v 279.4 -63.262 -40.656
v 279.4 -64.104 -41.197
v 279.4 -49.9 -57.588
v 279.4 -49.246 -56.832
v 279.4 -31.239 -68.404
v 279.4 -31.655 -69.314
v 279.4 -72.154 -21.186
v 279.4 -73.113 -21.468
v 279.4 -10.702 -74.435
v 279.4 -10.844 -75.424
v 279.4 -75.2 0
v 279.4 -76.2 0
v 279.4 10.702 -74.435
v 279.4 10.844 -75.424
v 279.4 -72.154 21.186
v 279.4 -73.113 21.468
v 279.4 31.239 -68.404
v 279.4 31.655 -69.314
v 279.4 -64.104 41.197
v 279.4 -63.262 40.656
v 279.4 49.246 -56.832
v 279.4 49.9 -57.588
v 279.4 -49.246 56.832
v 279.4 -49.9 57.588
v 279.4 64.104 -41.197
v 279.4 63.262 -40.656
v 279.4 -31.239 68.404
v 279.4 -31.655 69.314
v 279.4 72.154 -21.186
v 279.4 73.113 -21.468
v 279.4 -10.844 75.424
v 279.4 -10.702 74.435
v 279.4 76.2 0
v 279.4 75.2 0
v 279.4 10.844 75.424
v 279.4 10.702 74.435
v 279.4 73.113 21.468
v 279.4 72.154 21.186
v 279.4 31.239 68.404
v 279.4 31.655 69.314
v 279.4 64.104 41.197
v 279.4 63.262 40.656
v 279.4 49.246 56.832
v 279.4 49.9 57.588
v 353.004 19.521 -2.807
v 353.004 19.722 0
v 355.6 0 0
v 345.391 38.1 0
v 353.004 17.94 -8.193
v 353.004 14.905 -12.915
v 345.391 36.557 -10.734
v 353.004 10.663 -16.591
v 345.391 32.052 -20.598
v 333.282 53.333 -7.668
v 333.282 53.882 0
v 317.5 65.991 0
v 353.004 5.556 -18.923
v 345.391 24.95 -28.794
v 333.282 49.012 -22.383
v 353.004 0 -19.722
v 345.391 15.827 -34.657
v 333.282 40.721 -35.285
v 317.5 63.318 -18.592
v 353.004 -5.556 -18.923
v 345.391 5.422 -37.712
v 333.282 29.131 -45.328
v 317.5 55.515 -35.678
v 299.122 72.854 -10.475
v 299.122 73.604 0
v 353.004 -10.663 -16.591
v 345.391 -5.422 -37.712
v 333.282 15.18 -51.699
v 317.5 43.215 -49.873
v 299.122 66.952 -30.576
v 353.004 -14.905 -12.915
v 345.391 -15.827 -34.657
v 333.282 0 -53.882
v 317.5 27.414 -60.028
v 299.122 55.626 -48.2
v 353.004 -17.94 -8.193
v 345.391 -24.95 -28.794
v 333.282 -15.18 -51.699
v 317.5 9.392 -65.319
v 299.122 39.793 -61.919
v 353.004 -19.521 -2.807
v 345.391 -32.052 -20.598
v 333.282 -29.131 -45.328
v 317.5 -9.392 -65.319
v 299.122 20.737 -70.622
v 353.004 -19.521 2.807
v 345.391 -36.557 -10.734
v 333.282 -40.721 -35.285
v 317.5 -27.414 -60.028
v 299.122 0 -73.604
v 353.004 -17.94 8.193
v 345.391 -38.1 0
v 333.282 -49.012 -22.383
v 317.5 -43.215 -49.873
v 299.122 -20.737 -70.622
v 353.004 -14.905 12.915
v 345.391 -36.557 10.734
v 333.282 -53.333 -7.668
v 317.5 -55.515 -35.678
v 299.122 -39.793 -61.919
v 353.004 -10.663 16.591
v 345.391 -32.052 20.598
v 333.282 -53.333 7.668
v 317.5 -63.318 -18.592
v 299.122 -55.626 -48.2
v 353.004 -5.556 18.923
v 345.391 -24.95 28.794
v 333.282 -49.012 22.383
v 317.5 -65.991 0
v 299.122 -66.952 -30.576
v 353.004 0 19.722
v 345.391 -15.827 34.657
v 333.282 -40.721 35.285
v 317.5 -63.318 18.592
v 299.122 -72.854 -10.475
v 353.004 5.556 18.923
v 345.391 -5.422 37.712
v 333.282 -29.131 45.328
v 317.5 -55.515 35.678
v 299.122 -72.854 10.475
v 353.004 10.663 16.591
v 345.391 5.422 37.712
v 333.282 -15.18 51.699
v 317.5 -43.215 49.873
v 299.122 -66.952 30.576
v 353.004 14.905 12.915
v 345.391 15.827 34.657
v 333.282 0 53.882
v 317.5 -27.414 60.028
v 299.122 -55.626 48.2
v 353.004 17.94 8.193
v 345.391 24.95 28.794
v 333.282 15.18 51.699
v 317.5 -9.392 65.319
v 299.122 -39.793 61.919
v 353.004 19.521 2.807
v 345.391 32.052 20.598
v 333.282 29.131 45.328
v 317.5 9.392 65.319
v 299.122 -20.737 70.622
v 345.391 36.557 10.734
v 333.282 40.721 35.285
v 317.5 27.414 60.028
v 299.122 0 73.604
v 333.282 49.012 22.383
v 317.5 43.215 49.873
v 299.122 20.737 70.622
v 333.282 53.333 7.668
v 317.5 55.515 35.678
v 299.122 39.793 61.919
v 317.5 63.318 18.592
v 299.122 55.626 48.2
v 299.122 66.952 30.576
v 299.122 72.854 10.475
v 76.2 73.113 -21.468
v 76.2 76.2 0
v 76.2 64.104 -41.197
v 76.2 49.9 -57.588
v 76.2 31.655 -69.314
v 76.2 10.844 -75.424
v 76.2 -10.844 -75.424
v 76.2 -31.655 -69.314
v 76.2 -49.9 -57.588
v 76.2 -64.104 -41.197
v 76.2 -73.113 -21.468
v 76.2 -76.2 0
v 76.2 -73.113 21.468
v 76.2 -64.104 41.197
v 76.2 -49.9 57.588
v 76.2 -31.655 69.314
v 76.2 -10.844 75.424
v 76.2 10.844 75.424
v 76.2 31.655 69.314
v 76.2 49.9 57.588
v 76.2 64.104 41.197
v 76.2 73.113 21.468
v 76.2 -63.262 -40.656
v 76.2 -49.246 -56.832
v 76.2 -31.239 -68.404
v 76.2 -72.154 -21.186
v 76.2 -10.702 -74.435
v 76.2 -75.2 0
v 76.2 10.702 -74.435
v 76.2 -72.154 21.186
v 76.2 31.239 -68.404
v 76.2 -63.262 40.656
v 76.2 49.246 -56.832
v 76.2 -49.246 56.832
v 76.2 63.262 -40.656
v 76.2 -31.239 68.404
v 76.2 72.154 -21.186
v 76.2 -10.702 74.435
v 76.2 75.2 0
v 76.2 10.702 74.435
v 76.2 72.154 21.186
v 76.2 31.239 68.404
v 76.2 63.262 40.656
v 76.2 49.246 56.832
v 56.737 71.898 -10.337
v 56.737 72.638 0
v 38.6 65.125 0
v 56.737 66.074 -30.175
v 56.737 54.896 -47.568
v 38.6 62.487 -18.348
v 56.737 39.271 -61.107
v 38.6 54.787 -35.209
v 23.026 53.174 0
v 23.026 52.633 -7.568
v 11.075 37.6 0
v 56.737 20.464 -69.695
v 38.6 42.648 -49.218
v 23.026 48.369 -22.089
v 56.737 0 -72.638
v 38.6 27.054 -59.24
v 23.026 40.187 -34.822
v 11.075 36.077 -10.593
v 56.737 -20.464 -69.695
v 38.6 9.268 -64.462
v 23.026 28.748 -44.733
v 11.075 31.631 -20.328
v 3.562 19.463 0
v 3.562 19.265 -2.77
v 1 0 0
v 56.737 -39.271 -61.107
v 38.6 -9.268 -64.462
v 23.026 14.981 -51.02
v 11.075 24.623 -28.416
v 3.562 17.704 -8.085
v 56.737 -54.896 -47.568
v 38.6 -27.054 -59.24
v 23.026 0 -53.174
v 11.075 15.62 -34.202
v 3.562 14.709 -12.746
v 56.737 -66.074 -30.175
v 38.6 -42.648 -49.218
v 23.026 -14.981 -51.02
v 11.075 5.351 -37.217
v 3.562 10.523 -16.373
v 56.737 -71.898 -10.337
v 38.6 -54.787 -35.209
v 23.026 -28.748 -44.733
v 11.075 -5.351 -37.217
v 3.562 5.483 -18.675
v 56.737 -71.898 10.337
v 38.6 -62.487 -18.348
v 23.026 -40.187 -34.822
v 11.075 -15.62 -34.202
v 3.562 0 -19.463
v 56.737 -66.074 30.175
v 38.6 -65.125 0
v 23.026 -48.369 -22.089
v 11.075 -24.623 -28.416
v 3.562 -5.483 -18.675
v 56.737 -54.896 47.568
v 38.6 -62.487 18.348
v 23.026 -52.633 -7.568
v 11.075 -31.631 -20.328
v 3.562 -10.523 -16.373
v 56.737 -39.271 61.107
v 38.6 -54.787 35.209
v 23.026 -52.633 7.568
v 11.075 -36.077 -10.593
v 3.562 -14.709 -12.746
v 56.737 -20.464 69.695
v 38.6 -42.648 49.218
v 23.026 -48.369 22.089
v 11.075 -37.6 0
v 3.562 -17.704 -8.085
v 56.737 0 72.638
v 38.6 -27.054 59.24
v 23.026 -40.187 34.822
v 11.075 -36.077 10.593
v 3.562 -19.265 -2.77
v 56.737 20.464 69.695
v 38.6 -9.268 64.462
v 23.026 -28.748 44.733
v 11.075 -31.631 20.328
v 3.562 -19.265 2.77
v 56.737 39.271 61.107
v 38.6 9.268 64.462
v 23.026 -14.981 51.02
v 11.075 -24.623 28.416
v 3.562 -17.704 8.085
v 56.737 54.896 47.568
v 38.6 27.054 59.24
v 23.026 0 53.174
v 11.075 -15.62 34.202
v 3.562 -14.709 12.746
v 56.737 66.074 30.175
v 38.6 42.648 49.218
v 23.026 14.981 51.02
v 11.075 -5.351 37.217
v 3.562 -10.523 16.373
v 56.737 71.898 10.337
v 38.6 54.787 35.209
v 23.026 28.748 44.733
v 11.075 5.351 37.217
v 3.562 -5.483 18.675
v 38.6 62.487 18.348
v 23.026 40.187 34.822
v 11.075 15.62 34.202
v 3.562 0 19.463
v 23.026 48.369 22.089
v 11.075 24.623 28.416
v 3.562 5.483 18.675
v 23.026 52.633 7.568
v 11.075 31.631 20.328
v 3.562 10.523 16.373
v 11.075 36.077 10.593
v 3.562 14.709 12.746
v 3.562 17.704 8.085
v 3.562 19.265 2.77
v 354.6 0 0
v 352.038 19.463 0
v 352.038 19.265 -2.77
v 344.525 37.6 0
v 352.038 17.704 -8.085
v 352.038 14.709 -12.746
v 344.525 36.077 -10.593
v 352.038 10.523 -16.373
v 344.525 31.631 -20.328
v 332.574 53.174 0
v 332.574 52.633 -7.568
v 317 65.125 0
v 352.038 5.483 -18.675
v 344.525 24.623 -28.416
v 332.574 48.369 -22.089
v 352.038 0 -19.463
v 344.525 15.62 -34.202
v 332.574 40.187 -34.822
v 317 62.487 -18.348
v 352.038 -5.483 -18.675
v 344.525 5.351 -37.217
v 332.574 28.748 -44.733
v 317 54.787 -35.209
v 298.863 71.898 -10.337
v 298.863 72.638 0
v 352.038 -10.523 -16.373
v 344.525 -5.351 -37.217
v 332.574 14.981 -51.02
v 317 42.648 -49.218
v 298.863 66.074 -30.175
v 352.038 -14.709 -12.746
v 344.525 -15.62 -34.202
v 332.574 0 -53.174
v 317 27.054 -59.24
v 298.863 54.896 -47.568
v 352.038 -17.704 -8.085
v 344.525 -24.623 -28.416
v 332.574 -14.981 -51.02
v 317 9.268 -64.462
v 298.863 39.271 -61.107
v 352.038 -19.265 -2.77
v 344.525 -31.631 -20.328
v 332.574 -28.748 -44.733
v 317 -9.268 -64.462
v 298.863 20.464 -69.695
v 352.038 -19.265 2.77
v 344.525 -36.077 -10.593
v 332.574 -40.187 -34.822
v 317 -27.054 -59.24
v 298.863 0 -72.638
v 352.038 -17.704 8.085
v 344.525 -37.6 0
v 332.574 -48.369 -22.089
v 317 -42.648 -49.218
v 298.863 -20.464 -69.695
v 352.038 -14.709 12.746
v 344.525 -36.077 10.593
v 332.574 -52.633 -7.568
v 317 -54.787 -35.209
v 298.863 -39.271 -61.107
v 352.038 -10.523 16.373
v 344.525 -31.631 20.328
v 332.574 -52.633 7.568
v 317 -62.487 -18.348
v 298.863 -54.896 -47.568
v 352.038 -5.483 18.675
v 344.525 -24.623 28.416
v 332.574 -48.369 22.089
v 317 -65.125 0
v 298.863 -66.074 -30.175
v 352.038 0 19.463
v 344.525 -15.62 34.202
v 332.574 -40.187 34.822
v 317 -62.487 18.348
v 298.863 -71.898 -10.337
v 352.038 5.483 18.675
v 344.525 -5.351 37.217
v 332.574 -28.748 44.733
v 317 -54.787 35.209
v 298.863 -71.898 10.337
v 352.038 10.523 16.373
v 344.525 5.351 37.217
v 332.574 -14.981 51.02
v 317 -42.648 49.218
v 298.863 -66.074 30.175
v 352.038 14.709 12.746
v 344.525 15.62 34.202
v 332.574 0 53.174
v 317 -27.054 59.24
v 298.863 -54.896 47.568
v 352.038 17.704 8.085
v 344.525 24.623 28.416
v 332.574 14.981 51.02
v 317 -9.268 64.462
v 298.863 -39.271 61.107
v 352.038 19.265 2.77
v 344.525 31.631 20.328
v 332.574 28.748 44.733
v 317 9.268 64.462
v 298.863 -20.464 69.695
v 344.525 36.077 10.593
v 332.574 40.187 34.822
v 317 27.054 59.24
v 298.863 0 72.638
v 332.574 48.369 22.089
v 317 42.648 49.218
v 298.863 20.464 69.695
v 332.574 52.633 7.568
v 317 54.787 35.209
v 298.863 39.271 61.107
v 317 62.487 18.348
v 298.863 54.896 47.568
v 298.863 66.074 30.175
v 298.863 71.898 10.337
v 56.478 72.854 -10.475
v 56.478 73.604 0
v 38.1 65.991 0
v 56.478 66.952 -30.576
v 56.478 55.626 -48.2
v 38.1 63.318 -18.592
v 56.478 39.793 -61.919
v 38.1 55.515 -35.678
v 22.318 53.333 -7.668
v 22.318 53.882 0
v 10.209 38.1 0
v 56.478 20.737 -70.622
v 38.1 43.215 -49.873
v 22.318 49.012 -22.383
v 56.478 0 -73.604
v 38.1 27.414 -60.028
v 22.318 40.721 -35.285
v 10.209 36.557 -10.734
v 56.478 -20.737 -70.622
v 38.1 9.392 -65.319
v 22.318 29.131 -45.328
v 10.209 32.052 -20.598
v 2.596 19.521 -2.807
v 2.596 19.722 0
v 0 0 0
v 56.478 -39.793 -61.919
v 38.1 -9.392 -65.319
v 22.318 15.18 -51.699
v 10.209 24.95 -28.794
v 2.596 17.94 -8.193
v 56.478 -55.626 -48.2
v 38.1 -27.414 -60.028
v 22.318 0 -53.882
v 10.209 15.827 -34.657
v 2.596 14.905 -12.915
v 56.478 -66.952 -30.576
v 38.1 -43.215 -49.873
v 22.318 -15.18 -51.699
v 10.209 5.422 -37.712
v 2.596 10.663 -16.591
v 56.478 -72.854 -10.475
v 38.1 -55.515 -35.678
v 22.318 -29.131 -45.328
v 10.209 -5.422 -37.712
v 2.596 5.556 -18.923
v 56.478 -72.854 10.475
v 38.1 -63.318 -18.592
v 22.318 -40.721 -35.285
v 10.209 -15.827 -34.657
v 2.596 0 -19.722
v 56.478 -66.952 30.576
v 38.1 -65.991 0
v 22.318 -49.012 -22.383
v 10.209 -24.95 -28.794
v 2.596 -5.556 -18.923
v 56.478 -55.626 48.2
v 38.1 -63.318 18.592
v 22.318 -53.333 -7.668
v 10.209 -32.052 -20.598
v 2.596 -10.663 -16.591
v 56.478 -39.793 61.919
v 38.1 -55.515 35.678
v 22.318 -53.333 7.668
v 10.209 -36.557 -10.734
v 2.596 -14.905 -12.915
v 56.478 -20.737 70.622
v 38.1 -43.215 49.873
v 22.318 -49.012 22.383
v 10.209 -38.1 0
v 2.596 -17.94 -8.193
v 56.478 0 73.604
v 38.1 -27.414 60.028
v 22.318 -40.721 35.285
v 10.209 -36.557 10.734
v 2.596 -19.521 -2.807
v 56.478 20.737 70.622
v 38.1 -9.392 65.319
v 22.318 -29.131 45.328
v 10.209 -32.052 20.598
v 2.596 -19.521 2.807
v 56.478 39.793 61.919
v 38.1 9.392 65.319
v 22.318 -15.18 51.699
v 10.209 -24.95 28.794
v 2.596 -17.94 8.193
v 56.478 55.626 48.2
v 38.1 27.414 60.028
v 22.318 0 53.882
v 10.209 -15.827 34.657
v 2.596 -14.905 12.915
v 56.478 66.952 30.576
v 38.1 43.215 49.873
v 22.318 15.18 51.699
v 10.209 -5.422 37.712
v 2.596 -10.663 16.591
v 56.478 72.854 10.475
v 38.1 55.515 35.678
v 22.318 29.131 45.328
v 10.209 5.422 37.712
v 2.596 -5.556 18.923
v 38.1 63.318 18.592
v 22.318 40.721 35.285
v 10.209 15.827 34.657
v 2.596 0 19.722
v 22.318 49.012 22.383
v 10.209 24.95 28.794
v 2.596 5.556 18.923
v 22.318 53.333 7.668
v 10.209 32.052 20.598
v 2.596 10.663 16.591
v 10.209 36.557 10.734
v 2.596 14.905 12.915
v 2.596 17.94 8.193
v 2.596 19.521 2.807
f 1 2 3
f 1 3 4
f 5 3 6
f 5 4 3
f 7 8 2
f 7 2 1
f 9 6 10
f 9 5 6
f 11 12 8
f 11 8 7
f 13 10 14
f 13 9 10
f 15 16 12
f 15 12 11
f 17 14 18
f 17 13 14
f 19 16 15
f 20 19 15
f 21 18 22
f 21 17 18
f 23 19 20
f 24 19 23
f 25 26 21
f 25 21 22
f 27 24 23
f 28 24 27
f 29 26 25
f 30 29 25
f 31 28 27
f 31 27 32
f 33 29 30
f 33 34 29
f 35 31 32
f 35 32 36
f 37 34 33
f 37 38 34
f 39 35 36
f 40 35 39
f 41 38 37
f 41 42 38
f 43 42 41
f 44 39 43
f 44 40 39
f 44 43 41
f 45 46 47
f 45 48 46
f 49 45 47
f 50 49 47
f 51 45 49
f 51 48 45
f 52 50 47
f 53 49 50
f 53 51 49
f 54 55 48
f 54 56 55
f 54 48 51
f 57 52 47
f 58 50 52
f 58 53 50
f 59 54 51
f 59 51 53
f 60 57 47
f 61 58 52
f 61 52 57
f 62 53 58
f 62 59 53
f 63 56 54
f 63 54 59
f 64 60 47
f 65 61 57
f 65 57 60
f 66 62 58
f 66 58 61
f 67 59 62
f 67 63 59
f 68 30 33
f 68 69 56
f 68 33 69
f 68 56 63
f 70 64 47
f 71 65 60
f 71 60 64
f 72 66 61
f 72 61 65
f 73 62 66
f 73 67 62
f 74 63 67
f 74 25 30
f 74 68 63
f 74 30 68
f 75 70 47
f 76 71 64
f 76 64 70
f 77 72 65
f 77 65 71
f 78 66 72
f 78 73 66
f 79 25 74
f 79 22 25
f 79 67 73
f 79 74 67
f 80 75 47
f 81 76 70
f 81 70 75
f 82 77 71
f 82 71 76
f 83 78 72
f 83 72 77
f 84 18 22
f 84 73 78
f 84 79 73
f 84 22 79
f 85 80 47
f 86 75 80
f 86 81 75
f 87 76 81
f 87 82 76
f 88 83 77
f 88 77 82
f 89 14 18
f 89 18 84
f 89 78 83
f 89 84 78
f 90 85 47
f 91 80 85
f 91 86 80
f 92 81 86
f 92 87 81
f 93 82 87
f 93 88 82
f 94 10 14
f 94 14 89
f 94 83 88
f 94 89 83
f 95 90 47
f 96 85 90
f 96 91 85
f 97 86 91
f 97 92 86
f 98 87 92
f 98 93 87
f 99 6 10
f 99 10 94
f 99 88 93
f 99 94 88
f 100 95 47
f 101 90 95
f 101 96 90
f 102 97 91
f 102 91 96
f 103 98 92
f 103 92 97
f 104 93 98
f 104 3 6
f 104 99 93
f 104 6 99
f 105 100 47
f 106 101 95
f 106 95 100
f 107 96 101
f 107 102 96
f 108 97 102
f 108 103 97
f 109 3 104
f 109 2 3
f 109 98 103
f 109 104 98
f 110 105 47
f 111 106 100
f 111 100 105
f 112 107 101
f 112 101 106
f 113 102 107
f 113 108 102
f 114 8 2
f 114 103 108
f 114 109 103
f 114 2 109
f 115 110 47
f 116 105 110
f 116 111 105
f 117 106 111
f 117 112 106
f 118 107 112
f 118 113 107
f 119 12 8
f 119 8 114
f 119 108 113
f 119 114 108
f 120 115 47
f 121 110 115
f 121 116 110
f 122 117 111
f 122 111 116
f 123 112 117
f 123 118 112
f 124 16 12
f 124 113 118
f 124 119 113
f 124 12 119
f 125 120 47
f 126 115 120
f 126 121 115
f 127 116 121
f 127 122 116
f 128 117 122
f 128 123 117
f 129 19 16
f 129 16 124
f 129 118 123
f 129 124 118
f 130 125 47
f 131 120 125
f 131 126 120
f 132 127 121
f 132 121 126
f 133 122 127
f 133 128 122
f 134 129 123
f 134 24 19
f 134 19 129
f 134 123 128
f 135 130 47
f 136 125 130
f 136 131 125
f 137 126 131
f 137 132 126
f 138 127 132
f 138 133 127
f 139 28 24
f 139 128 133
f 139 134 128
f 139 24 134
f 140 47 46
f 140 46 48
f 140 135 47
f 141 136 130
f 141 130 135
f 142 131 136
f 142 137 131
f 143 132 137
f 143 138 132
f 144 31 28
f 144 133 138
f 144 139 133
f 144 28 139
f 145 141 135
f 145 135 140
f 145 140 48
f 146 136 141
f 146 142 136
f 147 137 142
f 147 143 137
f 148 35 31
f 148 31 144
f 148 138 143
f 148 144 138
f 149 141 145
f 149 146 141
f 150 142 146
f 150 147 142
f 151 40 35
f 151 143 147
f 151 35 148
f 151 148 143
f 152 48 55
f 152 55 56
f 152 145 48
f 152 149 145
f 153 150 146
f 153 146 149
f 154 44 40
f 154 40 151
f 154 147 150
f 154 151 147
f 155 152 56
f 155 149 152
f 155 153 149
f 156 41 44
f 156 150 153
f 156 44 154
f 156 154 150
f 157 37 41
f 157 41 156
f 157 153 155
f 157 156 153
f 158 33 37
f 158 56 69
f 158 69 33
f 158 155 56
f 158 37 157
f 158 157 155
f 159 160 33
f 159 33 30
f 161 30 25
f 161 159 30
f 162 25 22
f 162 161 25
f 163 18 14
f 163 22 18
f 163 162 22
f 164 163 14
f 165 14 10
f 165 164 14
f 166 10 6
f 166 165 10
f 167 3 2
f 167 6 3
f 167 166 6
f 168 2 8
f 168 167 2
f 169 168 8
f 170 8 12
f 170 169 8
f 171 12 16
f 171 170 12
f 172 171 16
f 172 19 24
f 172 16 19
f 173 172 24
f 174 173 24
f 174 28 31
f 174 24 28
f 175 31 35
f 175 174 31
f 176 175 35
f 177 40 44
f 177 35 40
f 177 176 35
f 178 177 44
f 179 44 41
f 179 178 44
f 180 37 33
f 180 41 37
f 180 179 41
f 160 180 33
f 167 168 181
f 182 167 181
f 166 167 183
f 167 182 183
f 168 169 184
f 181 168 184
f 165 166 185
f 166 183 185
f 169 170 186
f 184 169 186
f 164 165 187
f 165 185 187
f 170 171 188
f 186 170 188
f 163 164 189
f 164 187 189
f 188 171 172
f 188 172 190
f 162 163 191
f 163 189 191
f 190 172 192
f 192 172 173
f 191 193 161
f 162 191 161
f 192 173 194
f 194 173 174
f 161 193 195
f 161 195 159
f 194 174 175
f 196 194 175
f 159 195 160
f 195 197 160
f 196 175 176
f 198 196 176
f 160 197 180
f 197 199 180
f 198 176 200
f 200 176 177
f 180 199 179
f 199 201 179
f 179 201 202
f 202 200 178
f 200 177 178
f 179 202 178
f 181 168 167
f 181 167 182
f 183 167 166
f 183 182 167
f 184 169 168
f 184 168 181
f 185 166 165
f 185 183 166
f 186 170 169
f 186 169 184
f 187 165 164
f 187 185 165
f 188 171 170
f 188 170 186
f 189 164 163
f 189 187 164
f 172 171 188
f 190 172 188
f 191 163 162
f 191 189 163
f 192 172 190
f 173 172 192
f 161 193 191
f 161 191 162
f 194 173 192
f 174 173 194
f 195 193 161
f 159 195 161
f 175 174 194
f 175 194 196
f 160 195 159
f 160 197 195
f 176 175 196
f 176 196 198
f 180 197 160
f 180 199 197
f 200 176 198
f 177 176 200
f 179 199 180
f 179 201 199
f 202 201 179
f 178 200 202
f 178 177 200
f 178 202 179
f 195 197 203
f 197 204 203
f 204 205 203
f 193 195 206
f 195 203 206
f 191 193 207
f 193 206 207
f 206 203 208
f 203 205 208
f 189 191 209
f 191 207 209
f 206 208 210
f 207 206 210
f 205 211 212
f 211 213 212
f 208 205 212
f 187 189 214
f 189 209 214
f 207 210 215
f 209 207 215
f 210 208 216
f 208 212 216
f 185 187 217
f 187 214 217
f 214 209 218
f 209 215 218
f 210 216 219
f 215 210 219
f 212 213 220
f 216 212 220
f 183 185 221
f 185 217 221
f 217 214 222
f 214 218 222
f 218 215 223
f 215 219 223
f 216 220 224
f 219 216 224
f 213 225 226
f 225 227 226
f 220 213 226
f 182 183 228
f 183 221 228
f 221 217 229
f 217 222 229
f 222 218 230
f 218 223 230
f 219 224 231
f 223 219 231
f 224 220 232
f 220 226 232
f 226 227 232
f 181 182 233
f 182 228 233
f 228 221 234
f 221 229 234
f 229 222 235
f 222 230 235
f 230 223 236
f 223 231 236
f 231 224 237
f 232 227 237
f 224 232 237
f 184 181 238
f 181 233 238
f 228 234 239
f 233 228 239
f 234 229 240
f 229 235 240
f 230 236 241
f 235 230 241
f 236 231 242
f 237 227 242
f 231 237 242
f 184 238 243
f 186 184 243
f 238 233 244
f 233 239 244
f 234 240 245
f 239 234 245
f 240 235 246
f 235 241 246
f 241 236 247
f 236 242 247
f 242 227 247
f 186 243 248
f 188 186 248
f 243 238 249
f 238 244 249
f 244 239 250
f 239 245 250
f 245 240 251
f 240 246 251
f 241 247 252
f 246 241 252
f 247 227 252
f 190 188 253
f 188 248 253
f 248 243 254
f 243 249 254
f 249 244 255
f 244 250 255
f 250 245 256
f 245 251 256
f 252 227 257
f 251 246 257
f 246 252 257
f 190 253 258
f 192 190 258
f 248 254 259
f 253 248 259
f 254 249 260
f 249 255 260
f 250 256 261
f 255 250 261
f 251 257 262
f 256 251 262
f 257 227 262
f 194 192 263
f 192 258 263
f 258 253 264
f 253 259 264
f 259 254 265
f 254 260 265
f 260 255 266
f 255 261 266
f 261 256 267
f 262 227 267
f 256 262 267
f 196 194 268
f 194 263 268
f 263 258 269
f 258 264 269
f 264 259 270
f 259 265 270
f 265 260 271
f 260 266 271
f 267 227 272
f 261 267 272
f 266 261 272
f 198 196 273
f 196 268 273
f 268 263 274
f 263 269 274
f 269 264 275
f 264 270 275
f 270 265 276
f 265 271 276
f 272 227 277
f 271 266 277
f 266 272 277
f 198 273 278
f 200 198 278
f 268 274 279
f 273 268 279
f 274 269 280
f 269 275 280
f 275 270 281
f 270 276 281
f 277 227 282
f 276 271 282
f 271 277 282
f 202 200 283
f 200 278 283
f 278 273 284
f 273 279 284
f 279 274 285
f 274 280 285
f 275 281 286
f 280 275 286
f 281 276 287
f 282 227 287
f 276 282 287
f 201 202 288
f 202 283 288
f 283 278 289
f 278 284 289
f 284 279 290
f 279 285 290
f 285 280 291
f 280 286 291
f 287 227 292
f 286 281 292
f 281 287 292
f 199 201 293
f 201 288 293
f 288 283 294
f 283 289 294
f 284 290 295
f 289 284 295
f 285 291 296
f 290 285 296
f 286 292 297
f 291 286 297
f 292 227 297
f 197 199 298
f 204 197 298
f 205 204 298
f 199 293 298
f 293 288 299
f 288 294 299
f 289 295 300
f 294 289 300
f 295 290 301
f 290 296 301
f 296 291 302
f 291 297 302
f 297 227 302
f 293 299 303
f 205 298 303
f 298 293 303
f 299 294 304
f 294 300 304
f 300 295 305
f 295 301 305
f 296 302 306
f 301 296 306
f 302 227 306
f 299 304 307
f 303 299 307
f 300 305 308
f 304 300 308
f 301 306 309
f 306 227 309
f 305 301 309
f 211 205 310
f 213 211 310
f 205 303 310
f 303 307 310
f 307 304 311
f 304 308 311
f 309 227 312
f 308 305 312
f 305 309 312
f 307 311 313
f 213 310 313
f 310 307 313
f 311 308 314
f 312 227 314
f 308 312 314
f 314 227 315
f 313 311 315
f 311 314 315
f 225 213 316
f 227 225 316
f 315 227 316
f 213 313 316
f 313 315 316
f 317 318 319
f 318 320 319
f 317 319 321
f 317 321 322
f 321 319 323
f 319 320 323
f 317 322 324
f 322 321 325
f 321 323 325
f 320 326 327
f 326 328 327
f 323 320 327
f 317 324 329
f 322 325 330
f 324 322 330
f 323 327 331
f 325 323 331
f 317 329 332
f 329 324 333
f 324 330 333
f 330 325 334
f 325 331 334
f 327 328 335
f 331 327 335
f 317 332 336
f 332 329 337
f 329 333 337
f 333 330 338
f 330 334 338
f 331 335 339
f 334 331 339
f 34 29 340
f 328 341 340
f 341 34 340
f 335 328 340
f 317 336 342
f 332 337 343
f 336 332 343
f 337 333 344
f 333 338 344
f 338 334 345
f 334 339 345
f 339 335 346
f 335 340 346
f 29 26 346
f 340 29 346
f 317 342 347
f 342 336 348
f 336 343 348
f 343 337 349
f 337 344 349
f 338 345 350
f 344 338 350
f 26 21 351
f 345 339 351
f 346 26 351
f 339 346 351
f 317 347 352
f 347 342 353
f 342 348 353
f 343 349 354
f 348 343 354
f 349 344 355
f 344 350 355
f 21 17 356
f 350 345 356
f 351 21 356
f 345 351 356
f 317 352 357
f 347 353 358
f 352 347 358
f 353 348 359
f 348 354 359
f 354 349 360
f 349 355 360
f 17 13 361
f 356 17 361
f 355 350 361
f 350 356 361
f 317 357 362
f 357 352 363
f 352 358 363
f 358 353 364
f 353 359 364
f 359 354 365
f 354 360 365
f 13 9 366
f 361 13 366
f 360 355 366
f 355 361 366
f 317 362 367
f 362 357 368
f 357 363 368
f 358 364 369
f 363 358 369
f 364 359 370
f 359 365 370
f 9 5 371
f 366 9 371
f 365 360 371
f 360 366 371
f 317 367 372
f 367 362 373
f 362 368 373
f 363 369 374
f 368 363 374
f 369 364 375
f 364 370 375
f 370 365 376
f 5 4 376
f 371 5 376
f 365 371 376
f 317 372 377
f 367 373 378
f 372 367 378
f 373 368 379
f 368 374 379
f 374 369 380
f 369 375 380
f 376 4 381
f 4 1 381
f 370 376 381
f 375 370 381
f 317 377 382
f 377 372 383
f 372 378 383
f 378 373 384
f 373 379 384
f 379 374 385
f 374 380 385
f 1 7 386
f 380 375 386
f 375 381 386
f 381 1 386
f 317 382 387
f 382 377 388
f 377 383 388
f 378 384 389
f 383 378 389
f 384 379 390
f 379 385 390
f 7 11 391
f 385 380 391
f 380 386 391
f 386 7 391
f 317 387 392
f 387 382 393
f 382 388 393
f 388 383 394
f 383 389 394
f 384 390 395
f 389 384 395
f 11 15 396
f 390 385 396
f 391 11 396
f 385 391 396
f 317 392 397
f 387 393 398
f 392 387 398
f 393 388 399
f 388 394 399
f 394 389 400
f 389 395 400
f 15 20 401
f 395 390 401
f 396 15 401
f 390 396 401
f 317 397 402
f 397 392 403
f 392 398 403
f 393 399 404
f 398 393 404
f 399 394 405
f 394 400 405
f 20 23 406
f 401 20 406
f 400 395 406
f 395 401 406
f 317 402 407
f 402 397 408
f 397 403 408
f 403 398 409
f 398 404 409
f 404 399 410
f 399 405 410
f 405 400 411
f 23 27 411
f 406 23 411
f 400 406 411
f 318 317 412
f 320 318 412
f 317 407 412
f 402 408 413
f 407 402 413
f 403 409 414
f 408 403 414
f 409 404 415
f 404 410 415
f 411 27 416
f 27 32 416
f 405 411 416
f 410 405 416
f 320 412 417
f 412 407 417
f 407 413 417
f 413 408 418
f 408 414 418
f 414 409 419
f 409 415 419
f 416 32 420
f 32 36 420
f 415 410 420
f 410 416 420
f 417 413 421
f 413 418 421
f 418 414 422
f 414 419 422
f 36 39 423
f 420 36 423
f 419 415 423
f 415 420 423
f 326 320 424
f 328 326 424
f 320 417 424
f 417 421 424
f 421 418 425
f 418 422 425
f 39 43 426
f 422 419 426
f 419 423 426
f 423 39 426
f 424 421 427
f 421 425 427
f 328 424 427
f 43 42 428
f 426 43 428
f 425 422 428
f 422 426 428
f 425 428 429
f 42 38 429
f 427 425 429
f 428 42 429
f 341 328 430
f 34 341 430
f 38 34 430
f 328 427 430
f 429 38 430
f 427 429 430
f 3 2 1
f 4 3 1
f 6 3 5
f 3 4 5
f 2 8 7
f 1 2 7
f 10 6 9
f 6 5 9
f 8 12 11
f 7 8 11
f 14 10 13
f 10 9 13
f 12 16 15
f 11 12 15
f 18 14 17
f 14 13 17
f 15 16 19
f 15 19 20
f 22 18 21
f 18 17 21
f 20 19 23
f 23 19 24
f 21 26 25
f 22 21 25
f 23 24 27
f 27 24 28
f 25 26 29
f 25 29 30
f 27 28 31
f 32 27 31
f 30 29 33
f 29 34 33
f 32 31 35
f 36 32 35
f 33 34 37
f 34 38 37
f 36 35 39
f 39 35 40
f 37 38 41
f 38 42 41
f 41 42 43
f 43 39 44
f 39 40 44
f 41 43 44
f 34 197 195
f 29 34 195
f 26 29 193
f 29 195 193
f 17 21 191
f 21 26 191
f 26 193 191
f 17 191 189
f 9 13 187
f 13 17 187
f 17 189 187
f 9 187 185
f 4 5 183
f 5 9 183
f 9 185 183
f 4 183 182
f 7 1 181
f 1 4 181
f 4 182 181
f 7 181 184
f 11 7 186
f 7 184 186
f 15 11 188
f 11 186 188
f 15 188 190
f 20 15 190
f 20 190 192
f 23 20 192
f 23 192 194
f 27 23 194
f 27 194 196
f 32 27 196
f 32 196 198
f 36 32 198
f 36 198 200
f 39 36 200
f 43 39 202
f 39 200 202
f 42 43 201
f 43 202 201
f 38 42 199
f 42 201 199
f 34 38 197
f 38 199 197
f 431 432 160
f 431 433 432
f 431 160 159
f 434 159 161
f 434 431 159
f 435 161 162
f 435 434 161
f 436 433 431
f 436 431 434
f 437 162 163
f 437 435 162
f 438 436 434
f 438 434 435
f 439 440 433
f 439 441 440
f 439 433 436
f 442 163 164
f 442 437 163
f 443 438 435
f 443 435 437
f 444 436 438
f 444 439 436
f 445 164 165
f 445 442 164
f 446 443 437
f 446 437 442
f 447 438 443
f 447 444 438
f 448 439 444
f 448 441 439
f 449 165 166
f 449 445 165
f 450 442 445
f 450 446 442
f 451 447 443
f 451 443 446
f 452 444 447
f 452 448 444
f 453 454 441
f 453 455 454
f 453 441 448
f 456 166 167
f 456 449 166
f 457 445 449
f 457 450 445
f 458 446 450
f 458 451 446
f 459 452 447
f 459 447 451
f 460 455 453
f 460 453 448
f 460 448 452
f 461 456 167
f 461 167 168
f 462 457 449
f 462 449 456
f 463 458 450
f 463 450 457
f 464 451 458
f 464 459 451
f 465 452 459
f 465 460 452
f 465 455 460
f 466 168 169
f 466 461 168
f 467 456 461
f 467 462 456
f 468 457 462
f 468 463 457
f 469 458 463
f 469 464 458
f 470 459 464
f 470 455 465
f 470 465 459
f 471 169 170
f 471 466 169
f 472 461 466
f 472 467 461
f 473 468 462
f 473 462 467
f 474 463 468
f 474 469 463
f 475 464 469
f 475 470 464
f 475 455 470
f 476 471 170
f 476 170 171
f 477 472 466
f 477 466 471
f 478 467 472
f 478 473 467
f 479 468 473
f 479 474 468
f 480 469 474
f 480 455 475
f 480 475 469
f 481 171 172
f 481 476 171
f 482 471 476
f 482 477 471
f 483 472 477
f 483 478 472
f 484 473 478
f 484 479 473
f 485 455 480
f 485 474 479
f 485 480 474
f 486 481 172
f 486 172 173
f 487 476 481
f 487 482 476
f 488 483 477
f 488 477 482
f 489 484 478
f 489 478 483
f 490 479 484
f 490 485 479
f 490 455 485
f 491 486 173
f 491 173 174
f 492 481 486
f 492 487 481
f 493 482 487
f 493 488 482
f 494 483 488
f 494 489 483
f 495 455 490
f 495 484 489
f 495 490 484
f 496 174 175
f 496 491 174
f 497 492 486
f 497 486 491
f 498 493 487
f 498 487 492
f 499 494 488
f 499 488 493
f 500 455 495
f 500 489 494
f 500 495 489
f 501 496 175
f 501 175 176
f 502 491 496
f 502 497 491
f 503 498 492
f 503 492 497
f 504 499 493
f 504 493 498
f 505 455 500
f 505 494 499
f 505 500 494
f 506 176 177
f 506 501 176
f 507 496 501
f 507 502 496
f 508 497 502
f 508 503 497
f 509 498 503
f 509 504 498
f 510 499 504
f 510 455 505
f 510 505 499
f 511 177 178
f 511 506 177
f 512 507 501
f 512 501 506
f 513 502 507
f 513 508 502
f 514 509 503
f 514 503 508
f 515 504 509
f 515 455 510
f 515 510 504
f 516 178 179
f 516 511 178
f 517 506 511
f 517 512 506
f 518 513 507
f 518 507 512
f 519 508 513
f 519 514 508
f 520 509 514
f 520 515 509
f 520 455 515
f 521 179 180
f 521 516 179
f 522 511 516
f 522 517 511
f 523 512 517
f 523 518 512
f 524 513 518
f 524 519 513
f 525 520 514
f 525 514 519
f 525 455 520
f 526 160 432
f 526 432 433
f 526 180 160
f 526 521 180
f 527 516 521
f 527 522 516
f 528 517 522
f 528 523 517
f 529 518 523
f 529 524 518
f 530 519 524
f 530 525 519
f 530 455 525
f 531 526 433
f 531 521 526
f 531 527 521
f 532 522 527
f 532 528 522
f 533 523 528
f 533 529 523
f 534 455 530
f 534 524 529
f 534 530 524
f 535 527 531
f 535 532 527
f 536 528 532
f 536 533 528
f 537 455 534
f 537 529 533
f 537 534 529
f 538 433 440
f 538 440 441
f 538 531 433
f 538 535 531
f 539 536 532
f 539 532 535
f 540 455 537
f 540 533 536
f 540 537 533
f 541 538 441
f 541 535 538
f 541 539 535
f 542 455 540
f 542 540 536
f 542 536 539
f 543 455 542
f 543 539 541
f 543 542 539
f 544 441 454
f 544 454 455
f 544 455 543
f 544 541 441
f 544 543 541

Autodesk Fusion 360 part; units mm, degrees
sketch "Sketch1" plane through (0, 0, 0) normal (0, 0, 1) x (1, 0, 0)
sketch "Sketch2" plane through (0, 0, 0) normal (0, 0, 1) x (1, 0, 0)
  line L0 (0, 0) -> (355.6, 0)
  line L1 (279.4, 76.2) -> (76.2, 76.2)
  arc A0 (76.2, 76.2) -> (0, 0) centre (76.2, 0) ccw
  line L2 (177.8, 76.2) -> (177.8, 0)
  arc A1 (355.6, 0) -> (279.4, 76.2) centre (279.4, 0) ccw
  arc A2 (354.6, 0) -> (279.4, 75.2) centre (279.4, 0) ccw
  line L3 (279.4, 75.2) -> (76.2, 75.2)
  arc A3 (76.2, 75.2) -> (1, 0) centre (76.2, 0) ccw
  line L4 (76.2, 0) -> (76.2, 76.2)
  line L5 (279.4, 0) -> (279.4, 76.2)
  dimension "d1" = 355.6
  dimension "d4" = 76.2
  dimension "d5" = -1
revolve "Revolve1" add sketch "Sketch2" angle 360 about axis through (0, 0, 0) along (1, 0, 0) contours L0 A0 A3 L4 makes body 1
revolve "Revolve2" add sketch "Sketch2" angle 360 about axis through (0, 0, 0) along (1, 0, 0) separate body contours L0 A3 L4 | L0 L2 L3 L4 | L0 L2 L3 L5 | L0 A2 L5 makes body 2
revolve "Revolve3" add sketch "Sketch2" angle 360 about axis through (0, 0, 0) along (1, 0, 0) separate body contours L0 A1 A2 L5 makes body 3
revolve "Revolve4" add sketch "Sketch2" angle 360 about axis through (0, 0, 0) along (1, 0, 0) separate body contours L1 L2 L3 L4 | L1 L2 L3 L5 makes body 4
copy_body "Body->Comp1" bodies 1 removing the originals makes body 5 in component "Component"
copy_body "Body->Comp2" bodies 3 removing the originals makes body 6 in component "Component'"
copy_body "Body->Comp3" bodies 4 removing the originals makes body 7 in component "Component''"
component "Component" placed x (1, 0, 0) y (0, 1, 0) z (0, 0, 1) at (0, 0, 0)
component "Component'" placed x (1, 0, 0) y (0, 1, 0) z (0, 0, 1) at (0, 0, 0)
component "Component''" placed x (1, 0, 0) y (0, 1, 0) z (0, 0, 1) at (0, 0, 0)
hidden bodies 2
